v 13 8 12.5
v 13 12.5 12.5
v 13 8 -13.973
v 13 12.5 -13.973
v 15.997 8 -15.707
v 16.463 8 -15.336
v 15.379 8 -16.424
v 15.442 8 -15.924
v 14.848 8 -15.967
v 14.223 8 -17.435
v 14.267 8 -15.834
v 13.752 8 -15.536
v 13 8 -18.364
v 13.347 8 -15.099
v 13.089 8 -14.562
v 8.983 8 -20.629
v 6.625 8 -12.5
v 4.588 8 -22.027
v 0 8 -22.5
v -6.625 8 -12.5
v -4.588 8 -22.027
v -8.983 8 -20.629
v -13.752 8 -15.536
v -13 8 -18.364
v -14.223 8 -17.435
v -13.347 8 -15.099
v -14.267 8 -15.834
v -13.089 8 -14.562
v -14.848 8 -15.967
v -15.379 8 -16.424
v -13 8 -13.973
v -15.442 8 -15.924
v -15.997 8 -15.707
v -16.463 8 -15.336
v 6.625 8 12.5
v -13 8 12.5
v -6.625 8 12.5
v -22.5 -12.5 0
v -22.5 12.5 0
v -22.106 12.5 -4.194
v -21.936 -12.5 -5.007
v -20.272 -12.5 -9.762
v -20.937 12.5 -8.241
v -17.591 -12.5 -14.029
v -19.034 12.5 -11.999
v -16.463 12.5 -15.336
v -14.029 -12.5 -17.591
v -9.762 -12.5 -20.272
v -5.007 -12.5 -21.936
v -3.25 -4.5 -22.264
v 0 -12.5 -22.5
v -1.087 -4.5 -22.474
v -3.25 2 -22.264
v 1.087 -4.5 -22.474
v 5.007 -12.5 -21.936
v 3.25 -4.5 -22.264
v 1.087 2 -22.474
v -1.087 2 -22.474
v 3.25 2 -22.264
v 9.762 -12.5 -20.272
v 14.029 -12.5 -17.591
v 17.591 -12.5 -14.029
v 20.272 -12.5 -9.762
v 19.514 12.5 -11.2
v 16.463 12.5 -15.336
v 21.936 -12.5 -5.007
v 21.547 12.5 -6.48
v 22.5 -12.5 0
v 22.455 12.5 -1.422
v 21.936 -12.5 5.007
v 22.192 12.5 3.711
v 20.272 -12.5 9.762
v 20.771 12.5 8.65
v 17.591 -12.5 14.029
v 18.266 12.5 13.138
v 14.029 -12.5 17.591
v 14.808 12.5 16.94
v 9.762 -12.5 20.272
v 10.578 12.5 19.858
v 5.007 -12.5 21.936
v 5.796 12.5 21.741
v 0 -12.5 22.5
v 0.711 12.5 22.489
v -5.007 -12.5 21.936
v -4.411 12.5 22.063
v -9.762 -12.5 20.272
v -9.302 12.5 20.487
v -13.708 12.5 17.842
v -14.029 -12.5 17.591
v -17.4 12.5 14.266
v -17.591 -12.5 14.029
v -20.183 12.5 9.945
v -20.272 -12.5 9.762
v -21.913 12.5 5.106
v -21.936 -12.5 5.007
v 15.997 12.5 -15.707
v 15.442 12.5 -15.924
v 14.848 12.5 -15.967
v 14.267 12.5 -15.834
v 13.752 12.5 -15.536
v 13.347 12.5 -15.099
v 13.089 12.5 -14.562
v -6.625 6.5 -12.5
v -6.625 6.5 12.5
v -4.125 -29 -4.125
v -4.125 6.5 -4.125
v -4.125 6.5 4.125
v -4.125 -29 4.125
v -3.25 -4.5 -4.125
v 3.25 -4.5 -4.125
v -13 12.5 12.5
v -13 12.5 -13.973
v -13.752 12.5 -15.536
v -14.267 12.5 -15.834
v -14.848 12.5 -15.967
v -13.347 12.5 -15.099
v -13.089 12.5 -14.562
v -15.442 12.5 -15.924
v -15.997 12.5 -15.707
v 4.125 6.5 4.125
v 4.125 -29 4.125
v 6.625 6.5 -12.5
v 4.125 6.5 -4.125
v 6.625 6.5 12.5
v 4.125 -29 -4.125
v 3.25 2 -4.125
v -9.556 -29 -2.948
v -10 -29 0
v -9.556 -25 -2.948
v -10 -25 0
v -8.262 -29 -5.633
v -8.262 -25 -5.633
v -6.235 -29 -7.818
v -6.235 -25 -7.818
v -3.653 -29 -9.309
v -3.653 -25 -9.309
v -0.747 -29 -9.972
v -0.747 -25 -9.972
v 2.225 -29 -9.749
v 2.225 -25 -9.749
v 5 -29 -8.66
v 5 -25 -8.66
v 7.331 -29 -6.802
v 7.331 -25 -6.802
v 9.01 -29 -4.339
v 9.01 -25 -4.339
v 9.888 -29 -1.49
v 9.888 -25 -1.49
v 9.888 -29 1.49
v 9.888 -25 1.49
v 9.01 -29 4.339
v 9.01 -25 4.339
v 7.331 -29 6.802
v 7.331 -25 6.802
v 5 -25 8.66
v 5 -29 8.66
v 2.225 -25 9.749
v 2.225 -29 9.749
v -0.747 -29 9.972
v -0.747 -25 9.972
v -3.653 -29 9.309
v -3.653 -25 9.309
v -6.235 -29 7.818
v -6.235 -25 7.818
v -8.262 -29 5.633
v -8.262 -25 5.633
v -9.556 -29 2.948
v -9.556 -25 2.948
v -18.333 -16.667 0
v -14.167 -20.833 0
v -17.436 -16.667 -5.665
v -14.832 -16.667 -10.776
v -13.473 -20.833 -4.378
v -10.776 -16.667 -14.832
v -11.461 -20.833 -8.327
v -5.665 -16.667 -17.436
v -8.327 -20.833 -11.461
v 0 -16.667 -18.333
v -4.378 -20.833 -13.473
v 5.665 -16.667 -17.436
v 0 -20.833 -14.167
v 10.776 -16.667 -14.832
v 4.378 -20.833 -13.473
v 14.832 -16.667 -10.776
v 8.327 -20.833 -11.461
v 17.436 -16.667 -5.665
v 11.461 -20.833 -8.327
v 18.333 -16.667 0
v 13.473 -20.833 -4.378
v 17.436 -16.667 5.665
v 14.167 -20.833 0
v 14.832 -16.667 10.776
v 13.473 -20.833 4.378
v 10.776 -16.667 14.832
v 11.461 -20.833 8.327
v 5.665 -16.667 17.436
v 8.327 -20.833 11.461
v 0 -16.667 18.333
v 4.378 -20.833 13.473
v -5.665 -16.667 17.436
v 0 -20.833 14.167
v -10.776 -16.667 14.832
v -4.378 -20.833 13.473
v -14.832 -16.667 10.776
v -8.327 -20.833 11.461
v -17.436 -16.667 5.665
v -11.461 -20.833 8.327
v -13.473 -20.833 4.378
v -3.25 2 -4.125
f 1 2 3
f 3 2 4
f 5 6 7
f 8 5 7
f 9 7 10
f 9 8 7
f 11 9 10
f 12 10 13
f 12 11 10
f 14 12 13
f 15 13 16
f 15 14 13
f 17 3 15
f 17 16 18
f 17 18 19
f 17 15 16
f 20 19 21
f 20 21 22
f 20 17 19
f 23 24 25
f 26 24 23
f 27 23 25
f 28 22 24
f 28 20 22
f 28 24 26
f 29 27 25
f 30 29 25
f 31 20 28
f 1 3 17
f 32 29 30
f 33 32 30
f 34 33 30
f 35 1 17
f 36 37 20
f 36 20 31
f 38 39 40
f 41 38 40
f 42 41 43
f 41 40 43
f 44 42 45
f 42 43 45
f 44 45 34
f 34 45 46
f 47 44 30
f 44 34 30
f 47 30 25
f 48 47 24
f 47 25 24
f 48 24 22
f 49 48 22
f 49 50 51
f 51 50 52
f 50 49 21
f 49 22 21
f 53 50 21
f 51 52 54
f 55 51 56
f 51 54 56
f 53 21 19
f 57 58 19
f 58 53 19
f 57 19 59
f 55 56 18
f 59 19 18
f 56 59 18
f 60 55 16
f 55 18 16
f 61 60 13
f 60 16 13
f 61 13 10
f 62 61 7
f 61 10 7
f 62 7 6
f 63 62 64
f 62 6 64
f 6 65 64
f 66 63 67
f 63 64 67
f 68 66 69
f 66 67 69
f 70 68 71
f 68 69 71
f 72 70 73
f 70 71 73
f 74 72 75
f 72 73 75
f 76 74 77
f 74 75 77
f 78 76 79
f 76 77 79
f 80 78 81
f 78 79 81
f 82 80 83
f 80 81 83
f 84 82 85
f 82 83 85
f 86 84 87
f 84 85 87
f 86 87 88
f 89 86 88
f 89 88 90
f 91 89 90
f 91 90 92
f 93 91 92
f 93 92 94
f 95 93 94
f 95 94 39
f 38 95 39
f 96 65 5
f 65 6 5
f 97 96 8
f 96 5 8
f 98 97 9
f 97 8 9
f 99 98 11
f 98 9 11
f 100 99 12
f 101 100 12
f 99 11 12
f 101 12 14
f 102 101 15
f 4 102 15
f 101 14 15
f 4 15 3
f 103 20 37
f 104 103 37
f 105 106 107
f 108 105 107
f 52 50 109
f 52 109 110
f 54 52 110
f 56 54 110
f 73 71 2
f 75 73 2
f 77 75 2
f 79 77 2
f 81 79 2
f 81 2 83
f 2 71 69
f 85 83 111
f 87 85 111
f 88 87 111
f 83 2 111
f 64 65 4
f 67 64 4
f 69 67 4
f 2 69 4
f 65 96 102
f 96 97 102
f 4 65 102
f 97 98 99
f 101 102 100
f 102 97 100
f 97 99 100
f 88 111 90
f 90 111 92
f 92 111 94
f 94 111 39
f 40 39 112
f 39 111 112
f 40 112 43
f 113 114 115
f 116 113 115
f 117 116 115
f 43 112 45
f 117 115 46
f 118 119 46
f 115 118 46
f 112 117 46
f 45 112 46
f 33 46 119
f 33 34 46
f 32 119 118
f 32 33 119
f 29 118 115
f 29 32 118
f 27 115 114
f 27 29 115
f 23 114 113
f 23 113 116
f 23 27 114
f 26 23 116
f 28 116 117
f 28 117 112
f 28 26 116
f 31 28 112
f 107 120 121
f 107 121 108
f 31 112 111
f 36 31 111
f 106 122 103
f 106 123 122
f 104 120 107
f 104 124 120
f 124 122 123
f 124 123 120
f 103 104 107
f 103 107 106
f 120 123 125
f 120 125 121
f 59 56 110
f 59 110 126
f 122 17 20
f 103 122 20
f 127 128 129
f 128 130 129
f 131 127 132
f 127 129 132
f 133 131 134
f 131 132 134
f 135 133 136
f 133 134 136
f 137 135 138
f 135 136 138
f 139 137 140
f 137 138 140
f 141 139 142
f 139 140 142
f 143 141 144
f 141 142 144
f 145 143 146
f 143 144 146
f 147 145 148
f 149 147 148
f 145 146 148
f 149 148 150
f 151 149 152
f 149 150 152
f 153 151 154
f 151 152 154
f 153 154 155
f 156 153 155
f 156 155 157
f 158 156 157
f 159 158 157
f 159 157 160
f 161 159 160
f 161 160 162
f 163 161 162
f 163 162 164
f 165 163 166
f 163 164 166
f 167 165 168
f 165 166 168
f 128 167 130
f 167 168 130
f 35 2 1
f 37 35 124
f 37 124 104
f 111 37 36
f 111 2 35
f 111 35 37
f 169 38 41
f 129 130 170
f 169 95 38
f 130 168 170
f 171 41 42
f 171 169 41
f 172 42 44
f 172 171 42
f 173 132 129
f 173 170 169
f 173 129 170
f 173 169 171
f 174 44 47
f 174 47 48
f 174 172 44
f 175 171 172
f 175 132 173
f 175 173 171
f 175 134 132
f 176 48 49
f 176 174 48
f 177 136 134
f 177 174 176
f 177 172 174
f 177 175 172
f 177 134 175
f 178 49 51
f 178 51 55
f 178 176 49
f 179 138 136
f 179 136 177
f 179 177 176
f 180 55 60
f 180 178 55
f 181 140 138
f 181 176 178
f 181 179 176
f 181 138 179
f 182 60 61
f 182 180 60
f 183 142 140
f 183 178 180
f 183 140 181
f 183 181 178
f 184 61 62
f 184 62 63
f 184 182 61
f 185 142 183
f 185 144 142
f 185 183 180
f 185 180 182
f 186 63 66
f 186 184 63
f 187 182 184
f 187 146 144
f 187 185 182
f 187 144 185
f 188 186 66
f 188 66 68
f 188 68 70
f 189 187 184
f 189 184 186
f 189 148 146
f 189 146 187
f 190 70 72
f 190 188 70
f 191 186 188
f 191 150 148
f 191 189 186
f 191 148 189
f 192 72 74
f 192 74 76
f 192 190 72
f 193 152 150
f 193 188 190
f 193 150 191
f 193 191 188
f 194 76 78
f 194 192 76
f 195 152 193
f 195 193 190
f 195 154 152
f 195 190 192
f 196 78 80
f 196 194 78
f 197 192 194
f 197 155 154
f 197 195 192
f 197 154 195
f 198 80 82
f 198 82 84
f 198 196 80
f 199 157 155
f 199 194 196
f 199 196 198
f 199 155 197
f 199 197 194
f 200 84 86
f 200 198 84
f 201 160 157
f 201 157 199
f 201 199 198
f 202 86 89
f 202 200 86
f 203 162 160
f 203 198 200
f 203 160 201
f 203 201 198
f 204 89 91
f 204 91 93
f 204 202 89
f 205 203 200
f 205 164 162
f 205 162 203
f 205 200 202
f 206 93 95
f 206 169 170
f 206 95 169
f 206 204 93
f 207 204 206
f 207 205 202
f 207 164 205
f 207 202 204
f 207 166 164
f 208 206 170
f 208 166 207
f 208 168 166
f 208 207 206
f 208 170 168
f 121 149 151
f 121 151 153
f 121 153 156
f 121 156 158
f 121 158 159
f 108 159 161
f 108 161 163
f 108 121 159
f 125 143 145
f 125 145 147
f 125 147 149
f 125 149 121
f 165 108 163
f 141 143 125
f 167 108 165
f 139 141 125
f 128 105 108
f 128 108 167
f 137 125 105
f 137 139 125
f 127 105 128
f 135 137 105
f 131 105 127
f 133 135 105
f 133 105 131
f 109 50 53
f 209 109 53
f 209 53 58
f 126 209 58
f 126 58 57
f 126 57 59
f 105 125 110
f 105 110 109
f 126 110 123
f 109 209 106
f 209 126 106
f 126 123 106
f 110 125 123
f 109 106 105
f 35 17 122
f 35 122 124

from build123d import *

# Parameters (mm, degrees)
F0_W     = 10
F0_H     = 4
F0_W_2   = 22.5
F0_H_2   = 25
F2_W     = 8.25
F2_H     = 8.25
F3_DEPTH = 41.501
F2_W_2   = 13.25
F2_H_2   = 25
F4_DEPTH = 6
F2_W_3   = 6.375
F5_DEPTH = 4.5
F6_R     = 2
F8_W     = 6.5
F8_H     = 6.5
F9_DEPTH = 25


with BuildPart() as f1:
    # F0 (on Top) → F1 (revolve)
    with BuildSketch(Plane.XY):
        with Locations((-5, -27)):
            Rectangle(F0_W, F0_H)
        Polygon((0, -25), (0, -12.5), (-22.5, -12.5), (-10, -25), align=None)
        with Locations((-11.25, 0)):
            Rectangle(F0_W_2, F0_H_2)
    revolve(axis=Axis((0, -8.25, 0), (0, -1, 0)))

    # F2 (on face) → F3 (cut, through all)
    with BuildSketch(Plane(origin=(0, 12.5, 0), x_dir=(-1, 0, 0), z_dir=(0, 1, 0))):
        Rectangle(F2_W, F2_H)
    extrude(amount=-F3_DEPTH, mode=Mode.SUBTRACT)

    # F2 (on face) → F4 (cut)
    with BuildSketch(Plane(origin=(0, 12.5, 0), x_dir=(-1, 0, 0), z_dir=(0, 1, 0))):
        Rectangle(F2_W_2, F2_H_2)
        Rectangle(F2_W, F2_H, mode=Mode.SUBTRACT)
    extrude(amount=-F4_DEPTH, mode=Mode.SUBTRACT)

    # F2 (on face) → F5 (cut)
    with BuildSketch(Plane(origin=(0, 12.5, 0), x_dir=(-1, 0, 0), z_dir=(0, 1, 0))):
        with BuildLine():
            Line((13, -18.3643676722), (13, -12.5))
            Line((13, -12.5), (6.625, -12.5))
            Line((6.625, -12.5), (-6.625, -12.5))
            Line((-6.625, -12.5), (-13, -12.5))
            Line((-13, -12.5), (-13, -18.3643676722))
            ThreePointArc((-13, -18.3643676722), (-6.8209870025, -21.4411785197), (0, -22.5))
            ThreePointArc((0, -22.5), (6.8209870025, -21.4411785197), (13, -18.3643676722))
        make_face()
        with Locations((9.8125, 0)):
            Rectangle(F2_W_3, F2_H_2)
        Rectangle(F2_W_2, F2_H_2)
        Rectangle(F2_W, F2_H, mode=Mode.SUBTRACT)
        with Locations((-9.8125, 0)):
            Rectangle(F2_W_3, F2_H_2)
    extrude(amount=-F5_DEPTH, mode=Mode.SUBTRACT)

    # F6
    f6_edges = [f1.edges().sort_by_distance(p)[0] for p in [
        (13, 10.25, -18.364368),
        (-13, 10.25, -18.364368),
    ]]
    fillet(f6_edges, radius=F6_R)

    # F8 (on offset) → F9 (cut)
    with BuildSketch(Plane.XY.offset(-25)):
        with Locations((0, -1.25)):
            Rectangle(F8_W, F8_H)
    extrude(amount=F9_DEPTH, mode=Mode.SUBTRACT)


solid = f1.part
